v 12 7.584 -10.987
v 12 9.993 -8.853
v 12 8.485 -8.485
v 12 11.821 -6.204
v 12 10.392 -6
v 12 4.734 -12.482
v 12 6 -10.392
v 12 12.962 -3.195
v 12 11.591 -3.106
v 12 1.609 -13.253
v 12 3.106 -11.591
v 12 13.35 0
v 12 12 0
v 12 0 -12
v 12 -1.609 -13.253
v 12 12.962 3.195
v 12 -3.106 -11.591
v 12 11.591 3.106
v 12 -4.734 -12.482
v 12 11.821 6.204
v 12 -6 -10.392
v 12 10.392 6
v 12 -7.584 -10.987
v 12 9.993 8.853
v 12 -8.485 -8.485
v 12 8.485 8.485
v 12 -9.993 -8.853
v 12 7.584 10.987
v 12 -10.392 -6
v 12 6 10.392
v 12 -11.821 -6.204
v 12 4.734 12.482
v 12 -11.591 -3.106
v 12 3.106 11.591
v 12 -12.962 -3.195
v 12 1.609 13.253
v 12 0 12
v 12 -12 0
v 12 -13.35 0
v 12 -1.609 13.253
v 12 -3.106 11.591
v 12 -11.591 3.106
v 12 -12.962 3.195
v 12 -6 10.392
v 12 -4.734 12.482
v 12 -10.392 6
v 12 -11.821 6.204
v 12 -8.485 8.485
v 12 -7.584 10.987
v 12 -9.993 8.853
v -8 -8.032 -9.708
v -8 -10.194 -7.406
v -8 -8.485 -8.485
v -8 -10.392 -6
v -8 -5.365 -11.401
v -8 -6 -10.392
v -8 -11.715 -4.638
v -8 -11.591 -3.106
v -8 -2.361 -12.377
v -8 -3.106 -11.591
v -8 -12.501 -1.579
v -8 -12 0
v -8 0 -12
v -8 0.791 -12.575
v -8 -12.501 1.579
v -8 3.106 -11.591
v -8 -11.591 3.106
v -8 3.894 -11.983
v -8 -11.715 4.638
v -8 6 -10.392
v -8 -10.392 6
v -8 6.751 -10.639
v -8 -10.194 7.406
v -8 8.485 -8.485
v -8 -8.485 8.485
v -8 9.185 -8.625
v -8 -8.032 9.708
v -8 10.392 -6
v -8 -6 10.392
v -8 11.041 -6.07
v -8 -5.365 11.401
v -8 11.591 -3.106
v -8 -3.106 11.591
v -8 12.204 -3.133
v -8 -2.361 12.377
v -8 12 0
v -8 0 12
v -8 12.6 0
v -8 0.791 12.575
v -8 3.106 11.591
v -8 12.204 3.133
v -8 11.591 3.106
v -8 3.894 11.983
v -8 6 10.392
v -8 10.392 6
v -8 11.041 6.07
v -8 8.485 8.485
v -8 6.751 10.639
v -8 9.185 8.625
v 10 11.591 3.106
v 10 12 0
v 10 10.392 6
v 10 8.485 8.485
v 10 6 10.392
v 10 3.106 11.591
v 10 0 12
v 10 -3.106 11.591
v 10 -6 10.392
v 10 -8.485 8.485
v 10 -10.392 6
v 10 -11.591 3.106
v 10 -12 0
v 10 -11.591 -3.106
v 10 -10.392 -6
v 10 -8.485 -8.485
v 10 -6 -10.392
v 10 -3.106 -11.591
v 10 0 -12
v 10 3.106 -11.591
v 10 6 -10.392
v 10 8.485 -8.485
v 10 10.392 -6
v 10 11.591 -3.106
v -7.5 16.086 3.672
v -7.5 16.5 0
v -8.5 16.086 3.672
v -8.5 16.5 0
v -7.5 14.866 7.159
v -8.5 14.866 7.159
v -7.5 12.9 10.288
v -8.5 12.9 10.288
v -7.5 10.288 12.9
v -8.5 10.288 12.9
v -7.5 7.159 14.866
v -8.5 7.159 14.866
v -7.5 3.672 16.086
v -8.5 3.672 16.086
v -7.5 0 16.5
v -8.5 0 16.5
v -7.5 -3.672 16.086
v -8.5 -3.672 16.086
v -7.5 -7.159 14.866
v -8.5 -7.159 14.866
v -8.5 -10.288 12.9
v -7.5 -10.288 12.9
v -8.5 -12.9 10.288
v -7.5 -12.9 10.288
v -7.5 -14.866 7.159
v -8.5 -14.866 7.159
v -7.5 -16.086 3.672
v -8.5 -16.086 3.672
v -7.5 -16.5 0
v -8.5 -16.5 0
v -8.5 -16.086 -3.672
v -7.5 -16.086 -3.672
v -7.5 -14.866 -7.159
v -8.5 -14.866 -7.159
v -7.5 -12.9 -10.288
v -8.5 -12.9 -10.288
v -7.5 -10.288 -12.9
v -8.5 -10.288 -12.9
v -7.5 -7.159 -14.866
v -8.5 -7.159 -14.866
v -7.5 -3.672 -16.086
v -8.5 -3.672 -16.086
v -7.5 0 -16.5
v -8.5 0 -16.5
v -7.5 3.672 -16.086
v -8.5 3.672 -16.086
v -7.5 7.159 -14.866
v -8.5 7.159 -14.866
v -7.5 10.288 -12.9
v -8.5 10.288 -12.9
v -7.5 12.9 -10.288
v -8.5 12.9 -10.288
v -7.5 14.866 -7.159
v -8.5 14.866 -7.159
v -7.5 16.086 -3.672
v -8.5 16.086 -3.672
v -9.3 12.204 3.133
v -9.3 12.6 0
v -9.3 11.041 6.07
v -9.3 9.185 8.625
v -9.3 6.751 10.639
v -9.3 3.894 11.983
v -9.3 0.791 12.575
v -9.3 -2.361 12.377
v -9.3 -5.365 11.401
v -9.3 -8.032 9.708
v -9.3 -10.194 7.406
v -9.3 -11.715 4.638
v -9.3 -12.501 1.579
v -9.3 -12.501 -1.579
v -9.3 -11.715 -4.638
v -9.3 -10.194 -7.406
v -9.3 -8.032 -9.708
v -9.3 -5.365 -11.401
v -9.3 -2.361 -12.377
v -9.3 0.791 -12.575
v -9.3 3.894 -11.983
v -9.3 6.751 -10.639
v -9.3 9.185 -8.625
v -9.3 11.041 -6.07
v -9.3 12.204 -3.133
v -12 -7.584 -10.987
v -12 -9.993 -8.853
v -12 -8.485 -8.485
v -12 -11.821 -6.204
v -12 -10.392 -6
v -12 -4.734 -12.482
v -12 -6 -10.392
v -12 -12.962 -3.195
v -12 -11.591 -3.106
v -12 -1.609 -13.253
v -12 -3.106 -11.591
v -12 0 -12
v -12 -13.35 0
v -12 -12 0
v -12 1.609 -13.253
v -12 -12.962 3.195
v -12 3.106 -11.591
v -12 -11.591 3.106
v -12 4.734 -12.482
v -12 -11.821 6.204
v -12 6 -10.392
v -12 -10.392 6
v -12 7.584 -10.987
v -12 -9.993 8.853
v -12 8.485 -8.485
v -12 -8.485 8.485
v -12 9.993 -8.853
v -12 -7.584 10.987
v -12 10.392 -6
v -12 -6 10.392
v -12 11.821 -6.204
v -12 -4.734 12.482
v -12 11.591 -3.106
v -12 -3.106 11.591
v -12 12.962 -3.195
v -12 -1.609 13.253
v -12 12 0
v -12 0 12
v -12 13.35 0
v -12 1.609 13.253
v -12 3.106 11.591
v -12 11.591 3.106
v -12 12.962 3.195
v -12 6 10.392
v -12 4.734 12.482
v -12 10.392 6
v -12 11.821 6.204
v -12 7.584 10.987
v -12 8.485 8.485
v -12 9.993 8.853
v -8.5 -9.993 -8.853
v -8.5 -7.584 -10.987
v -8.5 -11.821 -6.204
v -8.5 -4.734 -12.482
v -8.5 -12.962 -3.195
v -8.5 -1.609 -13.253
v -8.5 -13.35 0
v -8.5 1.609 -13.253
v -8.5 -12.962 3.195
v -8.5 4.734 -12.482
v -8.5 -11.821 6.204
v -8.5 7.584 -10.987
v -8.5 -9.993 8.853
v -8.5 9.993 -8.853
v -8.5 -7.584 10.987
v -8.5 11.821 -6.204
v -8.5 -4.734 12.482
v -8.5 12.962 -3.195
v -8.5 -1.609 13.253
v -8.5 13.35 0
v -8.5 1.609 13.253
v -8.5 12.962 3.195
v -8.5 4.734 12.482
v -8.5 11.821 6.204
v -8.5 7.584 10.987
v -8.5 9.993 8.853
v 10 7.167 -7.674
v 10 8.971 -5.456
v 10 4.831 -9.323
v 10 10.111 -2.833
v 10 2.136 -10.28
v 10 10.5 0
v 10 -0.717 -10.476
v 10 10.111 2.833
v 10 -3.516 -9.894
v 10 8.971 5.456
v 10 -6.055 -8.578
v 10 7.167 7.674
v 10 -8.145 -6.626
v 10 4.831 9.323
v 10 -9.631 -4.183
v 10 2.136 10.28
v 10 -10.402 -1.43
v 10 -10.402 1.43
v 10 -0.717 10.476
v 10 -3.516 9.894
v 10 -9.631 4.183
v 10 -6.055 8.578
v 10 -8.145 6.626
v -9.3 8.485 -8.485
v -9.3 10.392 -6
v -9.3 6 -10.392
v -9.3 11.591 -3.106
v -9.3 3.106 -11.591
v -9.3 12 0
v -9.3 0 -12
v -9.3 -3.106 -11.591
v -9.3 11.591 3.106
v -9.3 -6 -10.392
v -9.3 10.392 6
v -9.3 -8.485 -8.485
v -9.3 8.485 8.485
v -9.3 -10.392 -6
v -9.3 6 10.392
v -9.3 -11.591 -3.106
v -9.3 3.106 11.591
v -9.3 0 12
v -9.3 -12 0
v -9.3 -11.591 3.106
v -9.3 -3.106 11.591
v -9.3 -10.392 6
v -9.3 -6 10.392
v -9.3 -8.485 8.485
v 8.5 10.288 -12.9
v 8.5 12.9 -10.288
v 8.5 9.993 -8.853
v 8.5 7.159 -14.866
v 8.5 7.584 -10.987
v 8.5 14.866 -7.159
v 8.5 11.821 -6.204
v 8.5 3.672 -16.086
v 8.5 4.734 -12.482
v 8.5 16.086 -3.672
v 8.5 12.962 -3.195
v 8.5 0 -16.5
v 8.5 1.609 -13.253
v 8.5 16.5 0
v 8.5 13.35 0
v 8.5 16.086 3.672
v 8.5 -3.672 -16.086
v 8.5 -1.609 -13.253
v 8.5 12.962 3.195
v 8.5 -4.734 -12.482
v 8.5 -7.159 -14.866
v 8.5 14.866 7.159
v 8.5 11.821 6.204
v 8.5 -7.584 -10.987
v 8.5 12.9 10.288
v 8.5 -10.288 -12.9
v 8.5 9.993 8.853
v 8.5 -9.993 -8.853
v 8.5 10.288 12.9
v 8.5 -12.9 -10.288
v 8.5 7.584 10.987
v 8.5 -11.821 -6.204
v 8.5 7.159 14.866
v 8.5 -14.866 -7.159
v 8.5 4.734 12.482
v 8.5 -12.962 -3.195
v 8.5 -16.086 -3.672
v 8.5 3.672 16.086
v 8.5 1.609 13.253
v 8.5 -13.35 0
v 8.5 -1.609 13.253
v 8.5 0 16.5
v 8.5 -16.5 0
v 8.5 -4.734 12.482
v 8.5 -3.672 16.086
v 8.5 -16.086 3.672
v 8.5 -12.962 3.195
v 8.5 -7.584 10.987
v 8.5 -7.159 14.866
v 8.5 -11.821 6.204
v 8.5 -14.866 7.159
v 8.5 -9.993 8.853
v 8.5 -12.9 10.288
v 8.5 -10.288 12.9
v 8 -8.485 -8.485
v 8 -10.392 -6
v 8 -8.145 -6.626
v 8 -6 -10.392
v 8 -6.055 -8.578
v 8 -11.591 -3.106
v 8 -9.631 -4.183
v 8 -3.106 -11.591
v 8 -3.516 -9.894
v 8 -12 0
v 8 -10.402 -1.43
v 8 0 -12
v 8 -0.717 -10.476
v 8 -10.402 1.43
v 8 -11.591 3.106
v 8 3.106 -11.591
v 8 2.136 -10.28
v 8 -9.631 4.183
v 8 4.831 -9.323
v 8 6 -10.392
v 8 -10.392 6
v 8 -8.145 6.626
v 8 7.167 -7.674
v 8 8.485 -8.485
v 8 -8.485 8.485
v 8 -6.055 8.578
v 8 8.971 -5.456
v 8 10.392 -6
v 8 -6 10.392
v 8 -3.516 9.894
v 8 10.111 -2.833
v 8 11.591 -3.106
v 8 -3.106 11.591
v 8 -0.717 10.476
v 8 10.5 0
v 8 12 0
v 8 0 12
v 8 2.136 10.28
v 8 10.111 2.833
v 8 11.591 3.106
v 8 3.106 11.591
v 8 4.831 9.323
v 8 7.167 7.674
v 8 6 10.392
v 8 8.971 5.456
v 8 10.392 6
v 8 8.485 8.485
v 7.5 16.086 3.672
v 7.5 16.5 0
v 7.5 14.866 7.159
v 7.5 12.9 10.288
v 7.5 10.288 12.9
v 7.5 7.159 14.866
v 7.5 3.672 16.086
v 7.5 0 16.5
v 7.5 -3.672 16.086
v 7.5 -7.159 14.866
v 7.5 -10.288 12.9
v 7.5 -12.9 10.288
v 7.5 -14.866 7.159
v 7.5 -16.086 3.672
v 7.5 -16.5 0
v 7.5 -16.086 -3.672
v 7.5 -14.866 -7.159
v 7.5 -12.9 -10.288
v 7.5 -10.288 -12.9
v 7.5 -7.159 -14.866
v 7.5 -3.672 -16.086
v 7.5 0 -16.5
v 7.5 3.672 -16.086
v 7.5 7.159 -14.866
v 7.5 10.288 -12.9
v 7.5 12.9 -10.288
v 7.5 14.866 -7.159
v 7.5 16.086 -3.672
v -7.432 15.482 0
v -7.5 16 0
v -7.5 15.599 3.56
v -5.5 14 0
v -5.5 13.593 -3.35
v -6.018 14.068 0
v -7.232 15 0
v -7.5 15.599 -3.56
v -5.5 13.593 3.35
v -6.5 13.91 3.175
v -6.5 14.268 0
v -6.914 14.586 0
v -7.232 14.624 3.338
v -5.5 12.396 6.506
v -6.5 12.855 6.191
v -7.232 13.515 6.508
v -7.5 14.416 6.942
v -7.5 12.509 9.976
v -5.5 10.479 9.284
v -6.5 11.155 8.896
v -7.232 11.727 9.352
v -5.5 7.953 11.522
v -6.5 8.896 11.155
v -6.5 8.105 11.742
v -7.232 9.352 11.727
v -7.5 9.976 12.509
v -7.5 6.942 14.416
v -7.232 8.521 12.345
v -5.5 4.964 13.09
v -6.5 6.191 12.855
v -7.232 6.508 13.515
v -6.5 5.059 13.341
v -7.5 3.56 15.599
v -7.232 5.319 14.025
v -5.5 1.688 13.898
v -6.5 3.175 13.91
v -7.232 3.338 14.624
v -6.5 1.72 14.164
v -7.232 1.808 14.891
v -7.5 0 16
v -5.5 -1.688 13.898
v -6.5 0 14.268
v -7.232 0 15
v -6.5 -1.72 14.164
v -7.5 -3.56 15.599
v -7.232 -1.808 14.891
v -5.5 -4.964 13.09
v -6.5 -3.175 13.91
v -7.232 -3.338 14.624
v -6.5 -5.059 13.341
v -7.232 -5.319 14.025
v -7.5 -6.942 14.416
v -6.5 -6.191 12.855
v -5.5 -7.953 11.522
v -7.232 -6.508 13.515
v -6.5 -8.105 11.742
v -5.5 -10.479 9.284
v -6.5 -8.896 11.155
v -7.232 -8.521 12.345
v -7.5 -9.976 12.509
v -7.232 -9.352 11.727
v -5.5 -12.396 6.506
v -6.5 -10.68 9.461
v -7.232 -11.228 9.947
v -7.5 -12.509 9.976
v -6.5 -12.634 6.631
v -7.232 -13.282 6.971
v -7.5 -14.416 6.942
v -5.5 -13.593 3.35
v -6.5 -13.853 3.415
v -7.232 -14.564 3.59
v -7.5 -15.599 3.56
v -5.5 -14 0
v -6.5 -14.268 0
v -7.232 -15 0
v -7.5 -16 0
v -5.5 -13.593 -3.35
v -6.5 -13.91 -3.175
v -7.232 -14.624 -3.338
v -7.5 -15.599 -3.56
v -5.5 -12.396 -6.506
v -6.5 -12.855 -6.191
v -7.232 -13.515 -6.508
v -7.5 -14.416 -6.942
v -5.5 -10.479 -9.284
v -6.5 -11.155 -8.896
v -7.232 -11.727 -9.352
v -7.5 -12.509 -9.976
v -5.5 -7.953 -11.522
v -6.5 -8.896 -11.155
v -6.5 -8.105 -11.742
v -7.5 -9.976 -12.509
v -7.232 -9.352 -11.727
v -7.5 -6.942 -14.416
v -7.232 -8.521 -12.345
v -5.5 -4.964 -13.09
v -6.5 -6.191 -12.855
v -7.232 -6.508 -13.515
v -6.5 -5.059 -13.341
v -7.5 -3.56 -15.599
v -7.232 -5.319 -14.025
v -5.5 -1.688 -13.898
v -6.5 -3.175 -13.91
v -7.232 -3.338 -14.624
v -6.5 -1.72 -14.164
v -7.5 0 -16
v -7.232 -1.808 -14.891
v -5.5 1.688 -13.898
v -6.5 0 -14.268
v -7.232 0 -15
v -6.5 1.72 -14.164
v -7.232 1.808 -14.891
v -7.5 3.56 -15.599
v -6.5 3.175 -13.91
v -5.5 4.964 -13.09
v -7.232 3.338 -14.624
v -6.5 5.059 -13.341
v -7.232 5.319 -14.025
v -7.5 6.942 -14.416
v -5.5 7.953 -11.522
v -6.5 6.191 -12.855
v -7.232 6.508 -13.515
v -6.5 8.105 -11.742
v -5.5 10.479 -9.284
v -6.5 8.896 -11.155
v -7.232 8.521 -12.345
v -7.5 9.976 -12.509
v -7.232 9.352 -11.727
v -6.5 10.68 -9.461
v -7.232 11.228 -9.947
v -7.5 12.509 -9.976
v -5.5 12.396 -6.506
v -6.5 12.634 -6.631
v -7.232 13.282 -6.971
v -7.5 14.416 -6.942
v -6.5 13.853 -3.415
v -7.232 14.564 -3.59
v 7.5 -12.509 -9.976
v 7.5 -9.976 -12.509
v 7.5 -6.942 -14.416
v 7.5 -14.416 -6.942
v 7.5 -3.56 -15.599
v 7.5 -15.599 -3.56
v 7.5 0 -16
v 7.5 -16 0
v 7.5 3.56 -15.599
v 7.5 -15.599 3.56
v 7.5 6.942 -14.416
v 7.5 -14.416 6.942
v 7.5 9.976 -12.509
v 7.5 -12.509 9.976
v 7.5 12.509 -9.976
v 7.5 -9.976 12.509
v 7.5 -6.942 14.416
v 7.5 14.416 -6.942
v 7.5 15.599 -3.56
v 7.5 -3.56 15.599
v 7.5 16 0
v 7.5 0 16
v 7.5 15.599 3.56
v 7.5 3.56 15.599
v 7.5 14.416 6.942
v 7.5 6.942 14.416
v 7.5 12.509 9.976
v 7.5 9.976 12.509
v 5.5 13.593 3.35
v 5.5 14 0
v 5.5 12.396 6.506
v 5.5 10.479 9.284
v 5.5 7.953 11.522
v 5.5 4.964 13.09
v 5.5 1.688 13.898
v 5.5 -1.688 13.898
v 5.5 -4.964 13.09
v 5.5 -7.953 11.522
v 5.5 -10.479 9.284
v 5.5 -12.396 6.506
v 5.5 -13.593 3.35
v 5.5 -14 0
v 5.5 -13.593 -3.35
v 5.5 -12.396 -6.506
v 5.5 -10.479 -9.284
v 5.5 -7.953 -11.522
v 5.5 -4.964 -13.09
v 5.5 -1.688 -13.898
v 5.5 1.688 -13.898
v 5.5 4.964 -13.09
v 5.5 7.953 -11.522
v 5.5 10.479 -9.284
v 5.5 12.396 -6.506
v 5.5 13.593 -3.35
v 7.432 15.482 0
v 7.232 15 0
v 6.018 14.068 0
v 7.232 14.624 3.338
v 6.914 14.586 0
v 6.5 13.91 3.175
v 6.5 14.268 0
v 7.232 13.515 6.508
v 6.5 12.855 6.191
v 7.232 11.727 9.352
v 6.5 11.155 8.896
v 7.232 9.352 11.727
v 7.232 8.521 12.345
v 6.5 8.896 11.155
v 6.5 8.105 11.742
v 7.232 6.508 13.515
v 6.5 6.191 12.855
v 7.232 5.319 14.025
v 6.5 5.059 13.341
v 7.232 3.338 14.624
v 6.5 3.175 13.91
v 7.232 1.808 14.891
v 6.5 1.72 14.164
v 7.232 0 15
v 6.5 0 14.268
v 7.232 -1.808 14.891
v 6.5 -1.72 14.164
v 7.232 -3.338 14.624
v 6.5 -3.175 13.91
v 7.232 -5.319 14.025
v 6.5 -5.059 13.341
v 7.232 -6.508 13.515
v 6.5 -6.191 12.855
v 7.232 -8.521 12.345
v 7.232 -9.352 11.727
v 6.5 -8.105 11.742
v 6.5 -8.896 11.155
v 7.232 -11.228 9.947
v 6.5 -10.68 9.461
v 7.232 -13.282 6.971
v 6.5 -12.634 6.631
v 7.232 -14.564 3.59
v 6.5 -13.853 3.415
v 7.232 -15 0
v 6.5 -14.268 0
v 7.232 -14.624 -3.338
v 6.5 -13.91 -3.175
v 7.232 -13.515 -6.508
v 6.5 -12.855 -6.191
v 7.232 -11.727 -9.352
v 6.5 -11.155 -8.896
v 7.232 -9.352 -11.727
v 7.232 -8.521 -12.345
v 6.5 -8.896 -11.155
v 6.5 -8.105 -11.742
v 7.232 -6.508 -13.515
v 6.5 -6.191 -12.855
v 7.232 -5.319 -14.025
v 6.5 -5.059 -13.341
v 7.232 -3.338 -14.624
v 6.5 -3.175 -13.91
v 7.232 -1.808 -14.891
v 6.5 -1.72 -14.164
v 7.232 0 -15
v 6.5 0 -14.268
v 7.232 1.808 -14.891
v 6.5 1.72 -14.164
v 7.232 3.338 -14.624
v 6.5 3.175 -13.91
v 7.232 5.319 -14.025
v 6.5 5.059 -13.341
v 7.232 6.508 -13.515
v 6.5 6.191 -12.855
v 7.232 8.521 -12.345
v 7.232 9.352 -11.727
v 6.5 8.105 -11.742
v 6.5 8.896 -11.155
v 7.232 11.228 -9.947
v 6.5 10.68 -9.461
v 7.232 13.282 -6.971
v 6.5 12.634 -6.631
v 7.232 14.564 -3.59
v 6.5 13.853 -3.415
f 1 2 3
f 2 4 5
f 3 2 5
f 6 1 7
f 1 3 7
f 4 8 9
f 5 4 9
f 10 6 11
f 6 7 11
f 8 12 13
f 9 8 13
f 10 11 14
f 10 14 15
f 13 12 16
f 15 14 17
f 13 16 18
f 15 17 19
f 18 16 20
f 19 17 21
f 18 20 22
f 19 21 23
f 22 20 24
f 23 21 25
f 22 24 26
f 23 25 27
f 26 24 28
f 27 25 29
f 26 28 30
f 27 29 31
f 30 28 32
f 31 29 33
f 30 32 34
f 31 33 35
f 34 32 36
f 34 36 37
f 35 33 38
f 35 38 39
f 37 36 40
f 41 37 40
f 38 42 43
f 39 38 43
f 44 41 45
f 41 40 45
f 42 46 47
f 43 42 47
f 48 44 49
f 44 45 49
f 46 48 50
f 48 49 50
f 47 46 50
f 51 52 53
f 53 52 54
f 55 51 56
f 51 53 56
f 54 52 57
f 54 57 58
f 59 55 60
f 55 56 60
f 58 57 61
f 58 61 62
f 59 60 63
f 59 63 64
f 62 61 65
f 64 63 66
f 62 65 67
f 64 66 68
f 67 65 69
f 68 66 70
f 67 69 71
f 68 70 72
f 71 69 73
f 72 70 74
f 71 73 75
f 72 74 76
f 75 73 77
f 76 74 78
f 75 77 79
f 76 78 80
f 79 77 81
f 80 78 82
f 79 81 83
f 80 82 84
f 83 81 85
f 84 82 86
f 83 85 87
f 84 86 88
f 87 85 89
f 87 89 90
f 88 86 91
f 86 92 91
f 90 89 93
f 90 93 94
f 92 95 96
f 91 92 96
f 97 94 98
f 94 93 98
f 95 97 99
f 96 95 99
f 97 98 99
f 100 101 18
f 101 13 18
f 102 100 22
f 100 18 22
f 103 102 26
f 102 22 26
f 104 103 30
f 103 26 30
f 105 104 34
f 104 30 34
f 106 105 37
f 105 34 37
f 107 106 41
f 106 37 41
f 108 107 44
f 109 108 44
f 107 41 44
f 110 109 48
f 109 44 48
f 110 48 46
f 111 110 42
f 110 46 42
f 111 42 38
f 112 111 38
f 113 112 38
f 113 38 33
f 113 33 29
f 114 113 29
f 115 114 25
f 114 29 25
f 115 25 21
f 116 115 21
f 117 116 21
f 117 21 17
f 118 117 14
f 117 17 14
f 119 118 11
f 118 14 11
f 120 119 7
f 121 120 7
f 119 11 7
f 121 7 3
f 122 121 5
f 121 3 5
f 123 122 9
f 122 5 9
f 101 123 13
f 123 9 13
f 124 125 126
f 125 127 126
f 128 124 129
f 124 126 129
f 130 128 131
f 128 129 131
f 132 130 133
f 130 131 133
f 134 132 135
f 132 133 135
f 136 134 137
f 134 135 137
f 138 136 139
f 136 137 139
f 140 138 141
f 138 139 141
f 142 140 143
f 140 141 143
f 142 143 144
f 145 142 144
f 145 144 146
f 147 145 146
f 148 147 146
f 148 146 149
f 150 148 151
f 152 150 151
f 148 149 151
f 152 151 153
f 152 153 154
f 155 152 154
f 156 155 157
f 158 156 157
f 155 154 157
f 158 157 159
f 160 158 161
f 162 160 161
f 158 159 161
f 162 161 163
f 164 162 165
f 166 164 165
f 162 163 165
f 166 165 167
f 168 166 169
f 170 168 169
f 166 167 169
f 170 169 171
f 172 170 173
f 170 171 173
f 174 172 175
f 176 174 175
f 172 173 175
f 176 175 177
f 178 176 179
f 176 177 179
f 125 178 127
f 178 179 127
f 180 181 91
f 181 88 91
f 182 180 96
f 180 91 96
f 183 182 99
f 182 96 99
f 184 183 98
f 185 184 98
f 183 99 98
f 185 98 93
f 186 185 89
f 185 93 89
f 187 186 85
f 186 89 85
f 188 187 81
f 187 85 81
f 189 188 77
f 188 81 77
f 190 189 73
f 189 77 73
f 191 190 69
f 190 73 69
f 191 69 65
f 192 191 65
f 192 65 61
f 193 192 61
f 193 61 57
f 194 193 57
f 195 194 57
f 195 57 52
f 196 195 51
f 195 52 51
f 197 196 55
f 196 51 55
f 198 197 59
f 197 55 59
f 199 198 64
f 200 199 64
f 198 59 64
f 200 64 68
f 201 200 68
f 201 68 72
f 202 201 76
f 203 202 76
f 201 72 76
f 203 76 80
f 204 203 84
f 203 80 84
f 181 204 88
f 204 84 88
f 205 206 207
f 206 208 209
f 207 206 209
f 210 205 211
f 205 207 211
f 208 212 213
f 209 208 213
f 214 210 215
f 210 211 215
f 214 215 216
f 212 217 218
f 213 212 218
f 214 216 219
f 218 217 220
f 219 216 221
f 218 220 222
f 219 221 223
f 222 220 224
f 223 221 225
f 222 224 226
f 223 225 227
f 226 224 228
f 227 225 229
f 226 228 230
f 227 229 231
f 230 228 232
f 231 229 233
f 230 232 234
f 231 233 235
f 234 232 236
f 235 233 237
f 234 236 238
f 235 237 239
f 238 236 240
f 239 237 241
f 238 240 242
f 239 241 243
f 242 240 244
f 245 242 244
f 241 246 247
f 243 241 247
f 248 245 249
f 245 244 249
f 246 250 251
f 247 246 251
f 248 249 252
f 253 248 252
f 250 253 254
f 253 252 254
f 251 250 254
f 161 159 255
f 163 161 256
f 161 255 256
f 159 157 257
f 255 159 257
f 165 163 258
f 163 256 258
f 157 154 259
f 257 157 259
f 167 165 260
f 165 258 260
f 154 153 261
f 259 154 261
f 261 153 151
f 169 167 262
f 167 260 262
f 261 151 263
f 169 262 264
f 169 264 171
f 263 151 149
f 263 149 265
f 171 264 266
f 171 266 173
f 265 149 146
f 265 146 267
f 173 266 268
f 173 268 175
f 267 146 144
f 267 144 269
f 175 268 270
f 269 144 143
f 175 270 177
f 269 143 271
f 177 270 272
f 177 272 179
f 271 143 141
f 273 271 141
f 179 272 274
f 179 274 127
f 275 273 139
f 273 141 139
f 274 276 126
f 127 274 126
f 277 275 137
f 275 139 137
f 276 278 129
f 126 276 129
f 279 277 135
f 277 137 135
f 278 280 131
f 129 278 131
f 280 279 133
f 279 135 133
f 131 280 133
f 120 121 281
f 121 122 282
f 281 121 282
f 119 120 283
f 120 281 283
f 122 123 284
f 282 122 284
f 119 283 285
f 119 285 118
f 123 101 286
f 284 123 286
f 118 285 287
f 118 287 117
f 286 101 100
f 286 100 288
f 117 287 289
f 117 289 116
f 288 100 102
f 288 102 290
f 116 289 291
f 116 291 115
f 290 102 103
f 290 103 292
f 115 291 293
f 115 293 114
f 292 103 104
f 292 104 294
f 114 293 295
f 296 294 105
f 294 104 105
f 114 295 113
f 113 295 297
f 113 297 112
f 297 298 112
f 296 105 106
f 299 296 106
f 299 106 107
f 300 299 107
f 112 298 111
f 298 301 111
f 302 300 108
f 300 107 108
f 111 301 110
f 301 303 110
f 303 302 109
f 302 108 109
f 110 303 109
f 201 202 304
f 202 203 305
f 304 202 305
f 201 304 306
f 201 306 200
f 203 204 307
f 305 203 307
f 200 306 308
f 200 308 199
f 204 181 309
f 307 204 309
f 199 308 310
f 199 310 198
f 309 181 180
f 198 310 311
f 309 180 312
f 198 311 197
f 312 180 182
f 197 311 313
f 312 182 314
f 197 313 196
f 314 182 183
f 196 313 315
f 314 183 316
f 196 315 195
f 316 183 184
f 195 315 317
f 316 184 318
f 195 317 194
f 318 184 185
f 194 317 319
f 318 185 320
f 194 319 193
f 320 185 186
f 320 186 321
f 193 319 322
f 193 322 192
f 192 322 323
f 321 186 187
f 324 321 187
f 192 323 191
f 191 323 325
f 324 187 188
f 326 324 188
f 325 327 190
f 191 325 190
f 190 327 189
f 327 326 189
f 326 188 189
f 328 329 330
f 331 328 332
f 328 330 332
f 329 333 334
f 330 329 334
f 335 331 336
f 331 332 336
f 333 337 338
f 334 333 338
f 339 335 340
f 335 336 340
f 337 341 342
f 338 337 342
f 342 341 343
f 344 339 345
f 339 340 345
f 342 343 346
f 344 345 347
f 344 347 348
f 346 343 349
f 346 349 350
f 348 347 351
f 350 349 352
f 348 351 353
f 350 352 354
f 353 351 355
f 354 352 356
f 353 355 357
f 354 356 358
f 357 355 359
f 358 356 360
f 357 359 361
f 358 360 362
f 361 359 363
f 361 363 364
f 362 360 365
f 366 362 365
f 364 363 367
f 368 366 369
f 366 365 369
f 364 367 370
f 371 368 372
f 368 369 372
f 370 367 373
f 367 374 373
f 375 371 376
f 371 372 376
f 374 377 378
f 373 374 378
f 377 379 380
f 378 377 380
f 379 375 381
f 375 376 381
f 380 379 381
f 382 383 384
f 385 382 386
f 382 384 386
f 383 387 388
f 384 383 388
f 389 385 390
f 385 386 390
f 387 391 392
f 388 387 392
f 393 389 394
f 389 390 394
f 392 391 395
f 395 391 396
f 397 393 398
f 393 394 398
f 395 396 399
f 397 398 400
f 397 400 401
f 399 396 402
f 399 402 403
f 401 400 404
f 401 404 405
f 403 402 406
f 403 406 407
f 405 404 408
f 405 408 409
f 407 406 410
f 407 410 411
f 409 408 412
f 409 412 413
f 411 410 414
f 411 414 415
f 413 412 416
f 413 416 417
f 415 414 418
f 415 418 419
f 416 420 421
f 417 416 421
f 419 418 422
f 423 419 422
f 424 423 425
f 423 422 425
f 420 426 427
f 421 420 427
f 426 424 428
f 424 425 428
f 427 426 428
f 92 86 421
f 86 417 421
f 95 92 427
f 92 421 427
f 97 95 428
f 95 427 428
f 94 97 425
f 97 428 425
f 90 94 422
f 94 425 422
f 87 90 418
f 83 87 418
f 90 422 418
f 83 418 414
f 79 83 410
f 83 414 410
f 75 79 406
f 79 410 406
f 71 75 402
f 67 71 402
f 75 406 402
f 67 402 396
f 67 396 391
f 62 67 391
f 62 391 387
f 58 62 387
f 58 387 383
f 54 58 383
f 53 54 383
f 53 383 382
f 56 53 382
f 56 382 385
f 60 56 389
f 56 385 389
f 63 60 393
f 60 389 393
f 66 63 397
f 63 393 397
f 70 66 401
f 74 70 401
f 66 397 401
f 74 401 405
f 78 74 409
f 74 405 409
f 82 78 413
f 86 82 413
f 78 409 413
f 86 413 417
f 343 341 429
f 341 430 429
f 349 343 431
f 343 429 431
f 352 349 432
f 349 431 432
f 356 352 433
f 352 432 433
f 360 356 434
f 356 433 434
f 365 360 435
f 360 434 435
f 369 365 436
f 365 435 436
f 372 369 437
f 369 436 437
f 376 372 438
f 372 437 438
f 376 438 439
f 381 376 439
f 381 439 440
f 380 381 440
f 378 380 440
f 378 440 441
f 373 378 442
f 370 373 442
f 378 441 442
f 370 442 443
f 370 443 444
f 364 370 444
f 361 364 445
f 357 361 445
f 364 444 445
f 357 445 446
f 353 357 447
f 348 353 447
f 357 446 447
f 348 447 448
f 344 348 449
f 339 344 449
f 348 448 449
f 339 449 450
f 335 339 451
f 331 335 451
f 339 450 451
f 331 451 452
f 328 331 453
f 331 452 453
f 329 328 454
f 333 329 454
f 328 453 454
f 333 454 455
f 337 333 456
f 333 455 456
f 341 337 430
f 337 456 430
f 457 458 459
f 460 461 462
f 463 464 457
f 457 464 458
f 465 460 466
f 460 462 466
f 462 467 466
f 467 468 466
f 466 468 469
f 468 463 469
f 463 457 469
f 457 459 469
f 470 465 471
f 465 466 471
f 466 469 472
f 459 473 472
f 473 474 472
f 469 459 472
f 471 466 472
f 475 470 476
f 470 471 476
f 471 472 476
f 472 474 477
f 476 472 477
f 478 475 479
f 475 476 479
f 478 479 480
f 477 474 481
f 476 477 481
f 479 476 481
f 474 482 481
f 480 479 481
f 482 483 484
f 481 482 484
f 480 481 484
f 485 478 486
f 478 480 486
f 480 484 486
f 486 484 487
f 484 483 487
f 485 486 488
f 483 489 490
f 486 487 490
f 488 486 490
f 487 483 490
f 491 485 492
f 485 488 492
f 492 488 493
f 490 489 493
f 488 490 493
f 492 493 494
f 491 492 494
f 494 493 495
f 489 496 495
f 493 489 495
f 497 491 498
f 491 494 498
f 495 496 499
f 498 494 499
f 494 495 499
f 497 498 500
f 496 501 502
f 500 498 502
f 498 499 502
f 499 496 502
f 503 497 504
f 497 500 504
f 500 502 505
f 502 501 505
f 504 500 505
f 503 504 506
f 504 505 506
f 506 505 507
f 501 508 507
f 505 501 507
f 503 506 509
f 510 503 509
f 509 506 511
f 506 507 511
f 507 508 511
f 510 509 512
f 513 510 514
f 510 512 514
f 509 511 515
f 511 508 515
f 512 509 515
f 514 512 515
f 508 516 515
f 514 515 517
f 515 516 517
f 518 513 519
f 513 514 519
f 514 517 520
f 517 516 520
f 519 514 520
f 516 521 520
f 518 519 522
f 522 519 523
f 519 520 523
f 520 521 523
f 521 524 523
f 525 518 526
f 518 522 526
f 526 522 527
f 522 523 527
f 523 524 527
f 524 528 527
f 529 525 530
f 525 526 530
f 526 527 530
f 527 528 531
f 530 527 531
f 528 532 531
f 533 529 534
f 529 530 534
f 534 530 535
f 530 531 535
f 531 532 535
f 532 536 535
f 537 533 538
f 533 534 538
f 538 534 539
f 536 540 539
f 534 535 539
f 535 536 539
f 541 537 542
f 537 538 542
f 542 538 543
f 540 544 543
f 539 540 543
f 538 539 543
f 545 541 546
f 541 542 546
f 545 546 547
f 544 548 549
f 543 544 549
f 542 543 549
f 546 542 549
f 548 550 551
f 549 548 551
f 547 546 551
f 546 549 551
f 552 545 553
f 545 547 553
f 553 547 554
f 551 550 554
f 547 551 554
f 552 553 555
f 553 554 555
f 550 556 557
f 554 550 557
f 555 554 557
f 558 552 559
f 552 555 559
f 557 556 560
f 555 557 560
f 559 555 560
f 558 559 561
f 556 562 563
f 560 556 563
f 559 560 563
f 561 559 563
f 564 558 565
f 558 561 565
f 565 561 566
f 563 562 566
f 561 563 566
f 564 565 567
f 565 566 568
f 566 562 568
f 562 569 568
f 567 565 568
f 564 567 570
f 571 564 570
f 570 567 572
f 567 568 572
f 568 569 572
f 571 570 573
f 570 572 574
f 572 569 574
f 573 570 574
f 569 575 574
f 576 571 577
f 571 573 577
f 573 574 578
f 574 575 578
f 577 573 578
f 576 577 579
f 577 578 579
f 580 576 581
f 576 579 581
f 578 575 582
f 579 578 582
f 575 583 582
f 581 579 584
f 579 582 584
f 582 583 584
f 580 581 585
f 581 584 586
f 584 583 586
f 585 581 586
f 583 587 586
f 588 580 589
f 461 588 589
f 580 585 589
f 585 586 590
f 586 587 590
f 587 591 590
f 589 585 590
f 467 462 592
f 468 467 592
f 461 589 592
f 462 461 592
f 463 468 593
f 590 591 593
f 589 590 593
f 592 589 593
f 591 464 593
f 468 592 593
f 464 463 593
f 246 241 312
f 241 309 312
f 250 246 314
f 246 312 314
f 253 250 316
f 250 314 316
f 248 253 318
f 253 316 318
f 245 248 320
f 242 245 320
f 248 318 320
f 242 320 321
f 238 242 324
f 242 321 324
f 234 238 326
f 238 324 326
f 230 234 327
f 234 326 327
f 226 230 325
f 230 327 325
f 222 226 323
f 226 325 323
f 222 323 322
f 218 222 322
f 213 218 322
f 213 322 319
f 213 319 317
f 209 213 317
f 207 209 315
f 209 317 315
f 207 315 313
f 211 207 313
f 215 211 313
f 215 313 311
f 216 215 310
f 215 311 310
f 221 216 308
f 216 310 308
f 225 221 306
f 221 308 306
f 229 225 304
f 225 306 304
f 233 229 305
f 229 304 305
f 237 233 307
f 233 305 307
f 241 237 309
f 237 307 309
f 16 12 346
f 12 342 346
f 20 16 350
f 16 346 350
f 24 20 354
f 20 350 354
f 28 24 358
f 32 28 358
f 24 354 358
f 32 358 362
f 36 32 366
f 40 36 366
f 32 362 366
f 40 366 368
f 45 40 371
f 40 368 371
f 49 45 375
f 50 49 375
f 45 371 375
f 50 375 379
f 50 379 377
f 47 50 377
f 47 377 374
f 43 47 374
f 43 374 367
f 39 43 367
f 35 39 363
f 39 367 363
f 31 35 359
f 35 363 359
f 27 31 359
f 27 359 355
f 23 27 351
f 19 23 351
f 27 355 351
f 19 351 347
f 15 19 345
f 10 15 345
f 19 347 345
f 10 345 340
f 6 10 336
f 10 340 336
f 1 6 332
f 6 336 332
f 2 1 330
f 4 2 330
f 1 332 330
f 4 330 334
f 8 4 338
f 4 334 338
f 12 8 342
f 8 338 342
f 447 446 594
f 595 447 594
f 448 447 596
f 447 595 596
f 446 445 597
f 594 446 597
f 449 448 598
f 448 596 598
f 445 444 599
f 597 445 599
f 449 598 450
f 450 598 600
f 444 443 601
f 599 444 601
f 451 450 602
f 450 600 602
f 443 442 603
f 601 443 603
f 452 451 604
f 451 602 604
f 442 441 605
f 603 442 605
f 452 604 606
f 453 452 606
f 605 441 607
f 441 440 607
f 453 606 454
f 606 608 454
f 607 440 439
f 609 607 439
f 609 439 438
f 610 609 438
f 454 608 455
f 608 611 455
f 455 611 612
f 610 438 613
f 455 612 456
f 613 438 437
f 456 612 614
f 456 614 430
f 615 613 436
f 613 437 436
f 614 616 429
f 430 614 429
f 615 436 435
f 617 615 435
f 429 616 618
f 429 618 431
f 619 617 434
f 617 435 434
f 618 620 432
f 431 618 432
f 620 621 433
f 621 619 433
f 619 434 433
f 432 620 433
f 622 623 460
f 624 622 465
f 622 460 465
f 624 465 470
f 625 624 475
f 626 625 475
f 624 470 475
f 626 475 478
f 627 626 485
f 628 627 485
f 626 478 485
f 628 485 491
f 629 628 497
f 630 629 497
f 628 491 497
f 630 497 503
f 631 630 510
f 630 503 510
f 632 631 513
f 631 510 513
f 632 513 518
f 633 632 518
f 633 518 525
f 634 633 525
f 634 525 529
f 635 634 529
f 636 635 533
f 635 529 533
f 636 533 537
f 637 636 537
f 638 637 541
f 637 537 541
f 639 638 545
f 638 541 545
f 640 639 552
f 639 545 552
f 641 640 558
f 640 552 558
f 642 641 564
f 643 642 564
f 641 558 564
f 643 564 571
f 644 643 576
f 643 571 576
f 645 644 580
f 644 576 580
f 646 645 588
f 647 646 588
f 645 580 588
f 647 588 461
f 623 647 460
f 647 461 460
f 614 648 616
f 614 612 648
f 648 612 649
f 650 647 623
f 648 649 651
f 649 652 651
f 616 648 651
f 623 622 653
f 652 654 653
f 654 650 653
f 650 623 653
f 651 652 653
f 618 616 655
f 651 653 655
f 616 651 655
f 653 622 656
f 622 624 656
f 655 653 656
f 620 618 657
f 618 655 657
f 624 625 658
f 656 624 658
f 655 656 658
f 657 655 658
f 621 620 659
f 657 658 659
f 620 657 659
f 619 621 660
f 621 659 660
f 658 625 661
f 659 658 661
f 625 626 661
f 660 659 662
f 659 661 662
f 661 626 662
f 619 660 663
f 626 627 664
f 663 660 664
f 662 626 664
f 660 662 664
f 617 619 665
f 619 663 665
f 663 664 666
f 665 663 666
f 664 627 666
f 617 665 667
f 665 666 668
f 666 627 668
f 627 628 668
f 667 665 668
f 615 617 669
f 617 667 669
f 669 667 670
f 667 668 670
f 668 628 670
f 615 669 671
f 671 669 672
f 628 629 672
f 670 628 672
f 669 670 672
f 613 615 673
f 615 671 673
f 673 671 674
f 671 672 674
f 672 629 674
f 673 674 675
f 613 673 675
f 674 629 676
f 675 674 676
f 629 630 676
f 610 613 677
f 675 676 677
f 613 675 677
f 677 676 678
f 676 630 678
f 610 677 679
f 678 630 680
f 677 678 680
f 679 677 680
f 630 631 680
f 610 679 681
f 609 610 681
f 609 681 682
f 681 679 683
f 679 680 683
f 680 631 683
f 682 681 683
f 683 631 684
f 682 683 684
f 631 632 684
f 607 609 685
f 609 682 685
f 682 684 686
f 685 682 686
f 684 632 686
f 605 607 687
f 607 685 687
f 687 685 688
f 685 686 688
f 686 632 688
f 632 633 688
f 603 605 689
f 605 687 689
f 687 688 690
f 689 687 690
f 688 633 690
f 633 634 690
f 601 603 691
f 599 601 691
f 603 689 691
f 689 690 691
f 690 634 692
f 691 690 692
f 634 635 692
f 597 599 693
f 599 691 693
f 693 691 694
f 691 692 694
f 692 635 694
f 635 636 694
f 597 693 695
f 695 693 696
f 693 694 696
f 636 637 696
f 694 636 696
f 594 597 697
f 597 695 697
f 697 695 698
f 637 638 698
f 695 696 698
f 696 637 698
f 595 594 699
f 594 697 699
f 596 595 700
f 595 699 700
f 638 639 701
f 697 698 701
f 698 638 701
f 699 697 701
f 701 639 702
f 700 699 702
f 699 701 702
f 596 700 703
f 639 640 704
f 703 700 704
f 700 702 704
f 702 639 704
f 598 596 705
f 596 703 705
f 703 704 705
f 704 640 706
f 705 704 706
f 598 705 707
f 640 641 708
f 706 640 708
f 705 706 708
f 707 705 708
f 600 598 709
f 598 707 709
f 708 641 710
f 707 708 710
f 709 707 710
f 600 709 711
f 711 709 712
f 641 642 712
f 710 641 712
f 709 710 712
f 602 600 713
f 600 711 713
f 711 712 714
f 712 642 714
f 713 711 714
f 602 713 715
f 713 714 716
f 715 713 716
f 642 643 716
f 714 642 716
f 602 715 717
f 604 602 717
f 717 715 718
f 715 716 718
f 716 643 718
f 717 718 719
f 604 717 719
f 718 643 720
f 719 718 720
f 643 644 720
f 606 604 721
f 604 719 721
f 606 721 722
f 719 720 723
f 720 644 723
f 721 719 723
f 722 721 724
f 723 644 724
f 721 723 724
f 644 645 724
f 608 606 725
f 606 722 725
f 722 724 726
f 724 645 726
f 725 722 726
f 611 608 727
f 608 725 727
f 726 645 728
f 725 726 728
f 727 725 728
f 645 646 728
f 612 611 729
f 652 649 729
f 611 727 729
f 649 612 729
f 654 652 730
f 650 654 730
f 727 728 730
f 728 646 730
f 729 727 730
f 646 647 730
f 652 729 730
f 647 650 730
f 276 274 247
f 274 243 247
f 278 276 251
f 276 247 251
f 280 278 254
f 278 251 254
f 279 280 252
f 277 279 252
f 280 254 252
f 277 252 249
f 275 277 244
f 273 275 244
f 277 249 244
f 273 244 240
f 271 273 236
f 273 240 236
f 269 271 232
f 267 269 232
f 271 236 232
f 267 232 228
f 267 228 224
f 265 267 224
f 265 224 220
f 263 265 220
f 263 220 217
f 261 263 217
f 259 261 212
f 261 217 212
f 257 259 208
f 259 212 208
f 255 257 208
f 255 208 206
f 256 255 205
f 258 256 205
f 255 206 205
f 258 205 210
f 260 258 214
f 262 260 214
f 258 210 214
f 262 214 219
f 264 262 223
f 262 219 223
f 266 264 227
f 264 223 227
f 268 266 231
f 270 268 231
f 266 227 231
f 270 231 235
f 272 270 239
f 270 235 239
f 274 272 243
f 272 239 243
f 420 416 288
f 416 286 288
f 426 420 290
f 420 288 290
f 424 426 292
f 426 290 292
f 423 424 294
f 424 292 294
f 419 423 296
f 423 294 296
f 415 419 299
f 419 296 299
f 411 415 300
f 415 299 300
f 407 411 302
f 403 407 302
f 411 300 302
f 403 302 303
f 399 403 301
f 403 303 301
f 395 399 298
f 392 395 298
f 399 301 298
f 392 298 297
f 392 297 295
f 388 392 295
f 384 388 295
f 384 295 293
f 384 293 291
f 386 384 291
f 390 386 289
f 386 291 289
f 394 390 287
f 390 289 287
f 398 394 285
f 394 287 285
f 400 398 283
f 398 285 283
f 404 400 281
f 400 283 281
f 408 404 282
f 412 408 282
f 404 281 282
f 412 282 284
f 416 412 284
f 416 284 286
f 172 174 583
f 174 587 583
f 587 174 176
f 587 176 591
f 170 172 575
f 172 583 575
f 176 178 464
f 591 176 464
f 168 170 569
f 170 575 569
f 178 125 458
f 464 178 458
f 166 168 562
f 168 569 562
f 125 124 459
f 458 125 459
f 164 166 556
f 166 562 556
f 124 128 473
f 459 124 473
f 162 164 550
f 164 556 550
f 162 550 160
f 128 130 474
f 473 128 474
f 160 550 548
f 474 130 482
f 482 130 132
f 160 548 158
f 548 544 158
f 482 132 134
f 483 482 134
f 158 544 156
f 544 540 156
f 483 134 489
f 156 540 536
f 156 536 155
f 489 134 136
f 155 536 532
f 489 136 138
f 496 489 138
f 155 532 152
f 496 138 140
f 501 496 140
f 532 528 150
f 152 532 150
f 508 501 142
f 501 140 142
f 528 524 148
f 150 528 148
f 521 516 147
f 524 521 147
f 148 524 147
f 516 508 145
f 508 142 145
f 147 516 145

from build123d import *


with BuildPart() as part:
    # Szkic1 → Obrót1 (revolve)
    with BuildSketch(Plane.XY):
        with BuildLine():
            Line((-12, 12), (-9.3, 12))
            Line((-9.3, 12), (-9.3, 12.6))
            Line((-9.3, 12.6), (-8, 12.6))
            Line((-8, 12.6), (-8, 12))
            Line((-8, 12), (8, 12))
            Line((8, 12), (8, 10.5))
            Line((8, 10.5), (10, 10.5))
            Line((10, 10.5), (10, 12))
            Line((10, 12), (12, 12))
            Line((12, 12), (12, 13.35))
            Line((12, 13.35), (8.5, 13.35))
            Line((8.5, 13.35), (8.5, 16.5))
            Line((8.5, 16.5), (7.5, 16.5))
            Line((7.5, 16.5), (7.5, 16))
            ThreePointArc((7.5, 16), (6.914213562, 14.585786438), (5.5, 14))
            Line((5.5, 14), (-5.5, 14))
            ThreePointArc((-5.5, 14), (-6.914213562, 14.585786438), (-7.5, 16))
            Line((-7.5, 16), (-7.5, 16.5))
            Line((-7.5, 16.5), (-8.5, 16.5))
            Line((-8.5, 16.5), (-8.5, 13.35))
            Line((-8.5, 13.35), (-12, 13.35))
            Line((-12, 13.35), (-12, 12))
        make_face()
    revolve(axis=Axis((-7.001985985, 0, 0), (1, 0, 0)))


solid = part.part
